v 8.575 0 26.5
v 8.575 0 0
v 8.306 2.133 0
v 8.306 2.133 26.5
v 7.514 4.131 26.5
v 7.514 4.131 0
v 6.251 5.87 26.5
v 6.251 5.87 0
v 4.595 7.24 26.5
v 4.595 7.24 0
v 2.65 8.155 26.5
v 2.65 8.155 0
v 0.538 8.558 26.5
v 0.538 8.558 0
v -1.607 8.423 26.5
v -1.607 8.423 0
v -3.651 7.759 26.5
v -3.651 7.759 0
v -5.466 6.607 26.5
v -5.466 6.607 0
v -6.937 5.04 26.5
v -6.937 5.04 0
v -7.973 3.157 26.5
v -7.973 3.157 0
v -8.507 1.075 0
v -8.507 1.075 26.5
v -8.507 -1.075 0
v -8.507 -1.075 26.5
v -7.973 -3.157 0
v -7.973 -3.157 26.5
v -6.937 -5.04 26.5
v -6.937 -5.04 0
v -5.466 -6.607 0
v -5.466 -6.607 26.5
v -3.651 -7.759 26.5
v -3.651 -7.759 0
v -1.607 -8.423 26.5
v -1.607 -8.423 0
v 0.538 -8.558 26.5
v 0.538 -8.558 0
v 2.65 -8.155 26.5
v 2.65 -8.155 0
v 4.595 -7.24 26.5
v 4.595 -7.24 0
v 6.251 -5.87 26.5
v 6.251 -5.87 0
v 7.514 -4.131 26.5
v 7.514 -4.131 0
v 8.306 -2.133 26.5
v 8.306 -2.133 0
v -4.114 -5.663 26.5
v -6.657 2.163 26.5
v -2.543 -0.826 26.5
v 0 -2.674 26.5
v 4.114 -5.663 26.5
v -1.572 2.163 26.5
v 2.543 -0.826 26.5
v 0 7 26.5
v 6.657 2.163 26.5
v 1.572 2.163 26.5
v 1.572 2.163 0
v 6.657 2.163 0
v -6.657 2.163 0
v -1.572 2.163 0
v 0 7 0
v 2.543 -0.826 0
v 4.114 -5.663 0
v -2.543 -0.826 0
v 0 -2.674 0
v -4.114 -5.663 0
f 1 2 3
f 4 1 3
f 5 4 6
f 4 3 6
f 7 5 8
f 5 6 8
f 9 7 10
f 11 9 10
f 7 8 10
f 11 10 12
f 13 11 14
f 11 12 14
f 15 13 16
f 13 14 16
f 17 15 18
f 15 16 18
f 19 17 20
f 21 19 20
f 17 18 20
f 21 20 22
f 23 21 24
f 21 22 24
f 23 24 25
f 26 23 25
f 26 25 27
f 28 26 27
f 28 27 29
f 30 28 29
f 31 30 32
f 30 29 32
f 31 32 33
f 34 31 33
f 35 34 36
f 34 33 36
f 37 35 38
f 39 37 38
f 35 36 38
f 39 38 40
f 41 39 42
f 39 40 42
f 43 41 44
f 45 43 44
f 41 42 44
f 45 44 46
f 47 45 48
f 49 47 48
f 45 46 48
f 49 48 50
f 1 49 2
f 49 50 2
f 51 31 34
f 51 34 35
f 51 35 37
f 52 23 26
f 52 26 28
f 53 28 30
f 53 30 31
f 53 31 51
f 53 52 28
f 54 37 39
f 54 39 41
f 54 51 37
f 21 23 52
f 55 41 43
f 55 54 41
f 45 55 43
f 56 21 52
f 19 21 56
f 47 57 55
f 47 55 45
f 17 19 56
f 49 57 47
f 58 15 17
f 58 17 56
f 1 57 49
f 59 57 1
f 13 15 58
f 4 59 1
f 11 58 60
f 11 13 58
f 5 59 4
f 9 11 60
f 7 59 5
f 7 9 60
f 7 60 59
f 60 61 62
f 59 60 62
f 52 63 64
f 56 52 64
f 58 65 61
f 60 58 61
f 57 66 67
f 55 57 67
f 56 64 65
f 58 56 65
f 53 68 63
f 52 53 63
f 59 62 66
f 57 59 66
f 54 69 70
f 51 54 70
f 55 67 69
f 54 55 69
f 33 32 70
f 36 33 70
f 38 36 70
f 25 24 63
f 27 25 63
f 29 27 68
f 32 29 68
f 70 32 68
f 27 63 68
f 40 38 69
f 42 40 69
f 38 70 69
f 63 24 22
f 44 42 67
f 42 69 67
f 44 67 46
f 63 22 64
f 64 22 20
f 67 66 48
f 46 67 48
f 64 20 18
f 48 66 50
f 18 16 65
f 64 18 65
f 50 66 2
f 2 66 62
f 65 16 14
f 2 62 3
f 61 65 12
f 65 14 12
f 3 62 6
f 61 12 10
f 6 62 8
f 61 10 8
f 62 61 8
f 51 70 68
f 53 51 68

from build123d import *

# Parameters (mm, degrees)
F0_R     = 8.575
F1_DEPTH = 26.5
F3_DEPTH = 26.5


with BuildPart() as f1:
    # F0 (on Top) → F1 (new body)
    with BuildSketch(Plane.XY):
        Circle(F0_R)
    extrude(amount=F1_DEPTH)

    # F2 (on face) → F3 (cut)
    with BuildSketch(Plane(origin=(0, 0, 0), x_dir=(1, 0, 0), z_dir=(0, 0, -1))):
        Polygon((0, 2.6737620788), (-4.114496766, 5.6631189606), (-2.542898848, 0.8262379212), align=None)
        Polygon((-1.571597918, -2.1631189606), (-2.542898848, 0.8262379212), (-6.6573956141, -2.1631189606), align=None)
        Polygon((1.571597918, -2.1631189606), (-1.571597918, -2.1631189606), (0, -7), align=None)
        Polygon((6.6573956141, -2.1631189606), (2.542898848, 0.8262379212), (1.571597918, -2.1631189606), align=None)
        Polygon((4.114496766, 5.6631189606), (0, 2.6737620788), (2.542898848, 0.8262379212), align=None)
        Polygon((0, 2.6737620788), (-2.542898848, 0.8262379212), (-1.571597918, -2.1631189606), (1.571597918, -2.1631189606), (2.542898848, 0.8262379212), align=None)
    extrude(amount=-F3_DEPTH, mode=Mode.SUBTRACT)


solid = f1.part
